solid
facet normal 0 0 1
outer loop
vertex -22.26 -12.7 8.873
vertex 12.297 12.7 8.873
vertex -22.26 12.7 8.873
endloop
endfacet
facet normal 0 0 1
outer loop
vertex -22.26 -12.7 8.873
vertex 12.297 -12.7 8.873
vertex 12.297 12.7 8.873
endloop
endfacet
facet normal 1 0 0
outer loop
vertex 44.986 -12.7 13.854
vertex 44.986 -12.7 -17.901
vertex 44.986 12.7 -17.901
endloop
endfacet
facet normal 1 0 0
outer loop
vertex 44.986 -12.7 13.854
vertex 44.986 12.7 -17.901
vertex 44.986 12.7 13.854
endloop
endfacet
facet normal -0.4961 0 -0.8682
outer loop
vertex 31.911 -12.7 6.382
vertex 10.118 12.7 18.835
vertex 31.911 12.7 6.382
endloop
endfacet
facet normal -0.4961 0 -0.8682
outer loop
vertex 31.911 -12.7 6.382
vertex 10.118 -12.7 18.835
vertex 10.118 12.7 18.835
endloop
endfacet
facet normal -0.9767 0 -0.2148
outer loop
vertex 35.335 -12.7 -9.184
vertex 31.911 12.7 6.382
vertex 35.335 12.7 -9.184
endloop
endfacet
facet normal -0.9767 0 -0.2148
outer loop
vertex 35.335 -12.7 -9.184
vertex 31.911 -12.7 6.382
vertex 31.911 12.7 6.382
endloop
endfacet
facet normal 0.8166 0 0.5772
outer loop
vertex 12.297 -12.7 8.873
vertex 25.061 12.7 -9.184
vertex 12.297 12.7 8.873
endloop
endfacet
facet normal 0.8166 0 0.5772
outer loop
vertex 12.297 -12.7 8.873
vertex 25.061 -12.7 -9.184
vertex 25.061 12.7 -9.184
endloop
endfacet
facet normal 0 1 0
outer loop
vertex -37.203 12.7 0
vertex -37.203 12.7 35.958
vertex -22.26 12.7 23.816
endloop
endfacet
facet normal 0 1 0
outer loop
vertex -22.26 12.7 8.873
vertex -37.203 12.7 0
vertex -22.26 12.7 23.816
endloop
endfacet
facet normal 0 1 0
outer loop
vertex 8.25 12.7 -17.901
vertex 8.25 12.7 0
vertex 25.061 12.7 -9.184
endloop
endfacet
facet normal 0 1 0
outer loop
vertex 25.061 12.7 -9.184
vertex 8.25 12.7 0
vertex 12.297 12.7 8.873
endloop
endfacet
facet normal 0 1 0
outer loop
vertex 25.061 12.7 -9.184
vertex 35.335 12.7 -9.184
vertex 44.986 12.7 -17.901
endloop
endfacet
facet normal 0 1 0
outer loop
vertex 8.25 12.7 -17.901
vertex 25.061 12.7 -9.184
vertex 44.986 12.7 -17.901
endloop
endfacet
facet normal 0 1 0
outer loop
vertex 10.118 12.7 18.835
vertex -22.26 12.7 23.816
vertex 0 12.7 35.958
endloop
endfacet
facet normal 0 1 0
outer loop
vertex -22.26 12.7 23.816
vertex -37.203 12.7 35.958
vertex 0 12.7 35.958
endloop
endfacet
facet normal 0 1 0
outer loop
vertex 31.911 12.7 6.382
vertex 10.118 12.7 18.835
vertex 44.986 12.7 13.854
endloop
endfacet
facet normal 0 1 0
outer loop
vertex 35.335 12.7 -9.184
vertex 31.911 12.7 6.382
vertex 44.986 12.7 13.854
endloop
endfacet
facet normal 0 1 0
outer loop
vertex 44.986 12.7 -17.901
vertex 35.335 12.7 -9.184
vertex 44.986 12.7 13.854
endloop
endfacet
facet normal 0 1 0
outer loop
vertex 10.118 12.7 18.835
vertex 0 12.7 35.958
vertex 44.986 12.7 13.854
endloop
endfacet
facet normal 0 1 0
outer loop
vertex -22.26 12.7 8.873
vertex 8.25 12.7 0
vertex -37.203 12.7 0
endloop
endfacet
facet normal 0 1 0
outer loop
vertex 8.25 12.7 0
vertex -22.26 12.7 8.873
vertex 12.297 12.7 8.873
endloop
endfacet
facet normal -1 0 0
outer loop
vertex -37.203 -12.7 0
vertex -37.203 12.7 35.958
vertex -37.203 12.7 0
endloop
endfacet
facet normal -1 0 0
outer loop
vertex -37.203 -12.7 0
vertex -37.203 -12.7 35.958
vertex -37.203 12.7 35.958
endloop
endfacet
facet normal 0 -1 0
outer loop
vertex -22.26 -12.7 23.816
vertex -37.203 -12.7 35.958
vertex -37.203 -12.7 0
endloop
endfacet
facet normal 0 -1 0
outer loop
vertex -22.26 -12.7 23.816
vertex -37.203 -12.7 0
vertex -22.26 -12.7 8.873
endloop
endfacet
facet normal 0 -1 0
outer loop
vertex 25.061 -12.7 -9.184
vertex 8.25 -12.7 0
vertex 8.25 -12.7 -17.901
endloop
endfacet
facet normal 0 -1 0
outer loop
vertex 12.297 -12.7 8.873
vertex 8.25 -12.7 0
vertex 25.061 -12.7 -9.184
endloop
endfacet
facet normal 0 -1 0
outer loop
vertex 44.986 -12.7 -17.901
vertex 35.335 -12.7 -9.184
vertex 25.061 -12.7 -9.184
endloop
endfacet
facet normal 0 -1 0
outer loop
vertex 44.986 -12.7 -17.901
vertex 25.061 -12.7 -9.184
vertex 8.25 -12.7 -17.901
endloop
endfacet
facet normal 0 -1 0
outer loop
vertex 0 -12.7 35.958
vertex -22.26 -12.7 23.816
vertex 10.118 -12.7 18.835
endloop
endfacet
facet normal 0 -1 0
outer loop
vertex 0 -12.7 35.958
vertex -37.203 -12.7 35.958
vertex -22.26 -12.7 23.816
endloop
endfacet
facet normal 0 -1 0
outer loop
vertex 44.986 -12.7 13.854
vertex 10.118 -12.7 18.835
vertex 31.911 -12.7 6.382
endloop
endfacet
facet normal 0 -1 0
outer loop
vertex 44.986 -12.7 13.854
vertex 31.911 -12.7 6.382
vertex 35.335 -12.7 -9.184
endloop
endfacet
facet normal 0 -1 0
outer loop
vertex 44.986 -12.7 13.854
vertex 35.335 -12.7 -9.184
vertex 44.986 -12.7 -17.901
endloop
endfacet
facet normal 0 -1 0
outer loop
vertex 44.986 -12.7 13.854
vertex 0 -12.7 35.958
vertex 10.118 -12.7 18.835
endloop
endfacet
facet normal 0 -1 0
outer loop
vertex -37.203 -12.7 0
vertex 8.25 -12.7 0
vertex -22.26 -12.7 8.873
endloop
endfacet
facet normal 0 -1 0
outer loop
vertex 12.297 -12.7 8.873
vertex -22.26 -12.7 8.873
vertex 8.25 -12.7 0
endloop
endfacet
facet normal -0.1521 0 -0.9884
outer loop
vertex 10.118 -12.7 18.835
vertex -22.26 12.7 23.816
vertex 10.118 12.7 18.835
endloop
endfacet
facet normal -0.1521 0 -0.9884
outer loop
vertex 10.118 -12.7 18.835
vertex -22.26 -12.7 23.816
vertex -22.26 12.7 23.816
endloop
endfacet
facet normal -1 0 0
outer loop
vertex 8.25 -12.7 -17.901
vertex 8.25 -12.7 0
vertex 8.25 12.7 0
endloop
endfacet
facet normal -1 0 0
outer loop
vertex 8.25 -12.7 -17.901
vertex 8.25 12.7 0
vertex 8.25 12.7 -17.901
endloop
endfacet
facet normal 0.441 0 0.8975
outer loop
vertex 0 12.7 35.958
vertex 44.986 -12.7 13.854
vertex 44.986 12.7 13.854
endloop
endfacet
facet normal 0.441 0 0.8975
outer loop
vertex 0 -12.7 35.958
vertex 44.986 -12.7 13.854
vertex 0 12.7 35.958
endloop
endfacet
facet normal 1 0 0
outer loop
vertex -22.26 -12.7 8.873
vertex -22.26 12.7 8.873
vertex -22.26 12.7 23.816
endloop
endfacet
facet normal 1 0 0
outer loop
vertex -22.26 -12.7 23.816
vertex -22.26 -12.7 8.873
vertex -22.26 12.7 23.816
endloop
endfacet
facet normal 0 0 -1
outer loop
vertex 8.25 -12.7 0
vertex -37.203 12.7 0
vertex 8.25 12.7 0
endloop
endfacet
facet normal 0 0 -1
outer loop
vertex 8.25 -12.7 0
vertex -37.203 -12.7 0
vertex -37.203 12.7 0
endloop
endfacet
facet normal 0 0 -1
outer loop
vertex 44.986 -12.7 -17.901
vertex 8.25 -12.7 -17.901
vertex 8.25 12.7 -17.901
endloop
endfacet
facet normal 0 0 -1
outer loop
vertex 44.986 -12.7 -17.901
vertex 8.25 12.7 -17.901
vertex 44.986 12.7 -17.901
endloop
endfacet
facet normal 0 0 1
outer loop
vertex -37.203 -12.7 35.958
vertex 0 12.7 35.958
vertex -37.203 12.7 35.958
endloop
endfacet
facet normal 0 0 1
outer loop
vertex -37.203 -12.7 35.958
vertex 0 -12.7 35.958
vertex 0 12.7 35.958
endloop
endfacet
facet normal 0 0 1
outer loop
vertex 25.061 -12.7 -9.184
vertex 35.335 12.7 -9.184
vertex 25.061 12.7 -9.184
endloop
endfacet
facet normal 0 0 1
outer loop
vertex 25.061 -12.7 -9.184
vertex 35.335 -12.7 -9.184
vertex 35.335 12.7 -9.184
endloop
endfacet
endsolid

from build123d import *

# Parameters (mm, degrees)
F1_DEPTH = 12.7


with BuildPart() as f1:
    # F0 (on Front) → F1 (new body, symmetric)
    with BuildSketch(Plane.XZ):
        Polygon((-37.203092, 0), (0, 0), (8.250058, 0), (8.250058, -17.90107), (44.986166, -17.90107), (44.986166, 13.853871), (0, 35.957802), (-37.203092, 35.957802), align=None)
        Polygon((-22.259591, 8.872705), (-22.259591, 23.816206), (10.117996, 18.83504), (31.910602, 6.38212), (35.335157, -9.184027), (25.061497, -9.184027), (12.297258, 8.872705), align=None, mode=Mode.SUBTRACT)
    extrude(amount=F1_DEPTH, both=True)


solid = f1.part
